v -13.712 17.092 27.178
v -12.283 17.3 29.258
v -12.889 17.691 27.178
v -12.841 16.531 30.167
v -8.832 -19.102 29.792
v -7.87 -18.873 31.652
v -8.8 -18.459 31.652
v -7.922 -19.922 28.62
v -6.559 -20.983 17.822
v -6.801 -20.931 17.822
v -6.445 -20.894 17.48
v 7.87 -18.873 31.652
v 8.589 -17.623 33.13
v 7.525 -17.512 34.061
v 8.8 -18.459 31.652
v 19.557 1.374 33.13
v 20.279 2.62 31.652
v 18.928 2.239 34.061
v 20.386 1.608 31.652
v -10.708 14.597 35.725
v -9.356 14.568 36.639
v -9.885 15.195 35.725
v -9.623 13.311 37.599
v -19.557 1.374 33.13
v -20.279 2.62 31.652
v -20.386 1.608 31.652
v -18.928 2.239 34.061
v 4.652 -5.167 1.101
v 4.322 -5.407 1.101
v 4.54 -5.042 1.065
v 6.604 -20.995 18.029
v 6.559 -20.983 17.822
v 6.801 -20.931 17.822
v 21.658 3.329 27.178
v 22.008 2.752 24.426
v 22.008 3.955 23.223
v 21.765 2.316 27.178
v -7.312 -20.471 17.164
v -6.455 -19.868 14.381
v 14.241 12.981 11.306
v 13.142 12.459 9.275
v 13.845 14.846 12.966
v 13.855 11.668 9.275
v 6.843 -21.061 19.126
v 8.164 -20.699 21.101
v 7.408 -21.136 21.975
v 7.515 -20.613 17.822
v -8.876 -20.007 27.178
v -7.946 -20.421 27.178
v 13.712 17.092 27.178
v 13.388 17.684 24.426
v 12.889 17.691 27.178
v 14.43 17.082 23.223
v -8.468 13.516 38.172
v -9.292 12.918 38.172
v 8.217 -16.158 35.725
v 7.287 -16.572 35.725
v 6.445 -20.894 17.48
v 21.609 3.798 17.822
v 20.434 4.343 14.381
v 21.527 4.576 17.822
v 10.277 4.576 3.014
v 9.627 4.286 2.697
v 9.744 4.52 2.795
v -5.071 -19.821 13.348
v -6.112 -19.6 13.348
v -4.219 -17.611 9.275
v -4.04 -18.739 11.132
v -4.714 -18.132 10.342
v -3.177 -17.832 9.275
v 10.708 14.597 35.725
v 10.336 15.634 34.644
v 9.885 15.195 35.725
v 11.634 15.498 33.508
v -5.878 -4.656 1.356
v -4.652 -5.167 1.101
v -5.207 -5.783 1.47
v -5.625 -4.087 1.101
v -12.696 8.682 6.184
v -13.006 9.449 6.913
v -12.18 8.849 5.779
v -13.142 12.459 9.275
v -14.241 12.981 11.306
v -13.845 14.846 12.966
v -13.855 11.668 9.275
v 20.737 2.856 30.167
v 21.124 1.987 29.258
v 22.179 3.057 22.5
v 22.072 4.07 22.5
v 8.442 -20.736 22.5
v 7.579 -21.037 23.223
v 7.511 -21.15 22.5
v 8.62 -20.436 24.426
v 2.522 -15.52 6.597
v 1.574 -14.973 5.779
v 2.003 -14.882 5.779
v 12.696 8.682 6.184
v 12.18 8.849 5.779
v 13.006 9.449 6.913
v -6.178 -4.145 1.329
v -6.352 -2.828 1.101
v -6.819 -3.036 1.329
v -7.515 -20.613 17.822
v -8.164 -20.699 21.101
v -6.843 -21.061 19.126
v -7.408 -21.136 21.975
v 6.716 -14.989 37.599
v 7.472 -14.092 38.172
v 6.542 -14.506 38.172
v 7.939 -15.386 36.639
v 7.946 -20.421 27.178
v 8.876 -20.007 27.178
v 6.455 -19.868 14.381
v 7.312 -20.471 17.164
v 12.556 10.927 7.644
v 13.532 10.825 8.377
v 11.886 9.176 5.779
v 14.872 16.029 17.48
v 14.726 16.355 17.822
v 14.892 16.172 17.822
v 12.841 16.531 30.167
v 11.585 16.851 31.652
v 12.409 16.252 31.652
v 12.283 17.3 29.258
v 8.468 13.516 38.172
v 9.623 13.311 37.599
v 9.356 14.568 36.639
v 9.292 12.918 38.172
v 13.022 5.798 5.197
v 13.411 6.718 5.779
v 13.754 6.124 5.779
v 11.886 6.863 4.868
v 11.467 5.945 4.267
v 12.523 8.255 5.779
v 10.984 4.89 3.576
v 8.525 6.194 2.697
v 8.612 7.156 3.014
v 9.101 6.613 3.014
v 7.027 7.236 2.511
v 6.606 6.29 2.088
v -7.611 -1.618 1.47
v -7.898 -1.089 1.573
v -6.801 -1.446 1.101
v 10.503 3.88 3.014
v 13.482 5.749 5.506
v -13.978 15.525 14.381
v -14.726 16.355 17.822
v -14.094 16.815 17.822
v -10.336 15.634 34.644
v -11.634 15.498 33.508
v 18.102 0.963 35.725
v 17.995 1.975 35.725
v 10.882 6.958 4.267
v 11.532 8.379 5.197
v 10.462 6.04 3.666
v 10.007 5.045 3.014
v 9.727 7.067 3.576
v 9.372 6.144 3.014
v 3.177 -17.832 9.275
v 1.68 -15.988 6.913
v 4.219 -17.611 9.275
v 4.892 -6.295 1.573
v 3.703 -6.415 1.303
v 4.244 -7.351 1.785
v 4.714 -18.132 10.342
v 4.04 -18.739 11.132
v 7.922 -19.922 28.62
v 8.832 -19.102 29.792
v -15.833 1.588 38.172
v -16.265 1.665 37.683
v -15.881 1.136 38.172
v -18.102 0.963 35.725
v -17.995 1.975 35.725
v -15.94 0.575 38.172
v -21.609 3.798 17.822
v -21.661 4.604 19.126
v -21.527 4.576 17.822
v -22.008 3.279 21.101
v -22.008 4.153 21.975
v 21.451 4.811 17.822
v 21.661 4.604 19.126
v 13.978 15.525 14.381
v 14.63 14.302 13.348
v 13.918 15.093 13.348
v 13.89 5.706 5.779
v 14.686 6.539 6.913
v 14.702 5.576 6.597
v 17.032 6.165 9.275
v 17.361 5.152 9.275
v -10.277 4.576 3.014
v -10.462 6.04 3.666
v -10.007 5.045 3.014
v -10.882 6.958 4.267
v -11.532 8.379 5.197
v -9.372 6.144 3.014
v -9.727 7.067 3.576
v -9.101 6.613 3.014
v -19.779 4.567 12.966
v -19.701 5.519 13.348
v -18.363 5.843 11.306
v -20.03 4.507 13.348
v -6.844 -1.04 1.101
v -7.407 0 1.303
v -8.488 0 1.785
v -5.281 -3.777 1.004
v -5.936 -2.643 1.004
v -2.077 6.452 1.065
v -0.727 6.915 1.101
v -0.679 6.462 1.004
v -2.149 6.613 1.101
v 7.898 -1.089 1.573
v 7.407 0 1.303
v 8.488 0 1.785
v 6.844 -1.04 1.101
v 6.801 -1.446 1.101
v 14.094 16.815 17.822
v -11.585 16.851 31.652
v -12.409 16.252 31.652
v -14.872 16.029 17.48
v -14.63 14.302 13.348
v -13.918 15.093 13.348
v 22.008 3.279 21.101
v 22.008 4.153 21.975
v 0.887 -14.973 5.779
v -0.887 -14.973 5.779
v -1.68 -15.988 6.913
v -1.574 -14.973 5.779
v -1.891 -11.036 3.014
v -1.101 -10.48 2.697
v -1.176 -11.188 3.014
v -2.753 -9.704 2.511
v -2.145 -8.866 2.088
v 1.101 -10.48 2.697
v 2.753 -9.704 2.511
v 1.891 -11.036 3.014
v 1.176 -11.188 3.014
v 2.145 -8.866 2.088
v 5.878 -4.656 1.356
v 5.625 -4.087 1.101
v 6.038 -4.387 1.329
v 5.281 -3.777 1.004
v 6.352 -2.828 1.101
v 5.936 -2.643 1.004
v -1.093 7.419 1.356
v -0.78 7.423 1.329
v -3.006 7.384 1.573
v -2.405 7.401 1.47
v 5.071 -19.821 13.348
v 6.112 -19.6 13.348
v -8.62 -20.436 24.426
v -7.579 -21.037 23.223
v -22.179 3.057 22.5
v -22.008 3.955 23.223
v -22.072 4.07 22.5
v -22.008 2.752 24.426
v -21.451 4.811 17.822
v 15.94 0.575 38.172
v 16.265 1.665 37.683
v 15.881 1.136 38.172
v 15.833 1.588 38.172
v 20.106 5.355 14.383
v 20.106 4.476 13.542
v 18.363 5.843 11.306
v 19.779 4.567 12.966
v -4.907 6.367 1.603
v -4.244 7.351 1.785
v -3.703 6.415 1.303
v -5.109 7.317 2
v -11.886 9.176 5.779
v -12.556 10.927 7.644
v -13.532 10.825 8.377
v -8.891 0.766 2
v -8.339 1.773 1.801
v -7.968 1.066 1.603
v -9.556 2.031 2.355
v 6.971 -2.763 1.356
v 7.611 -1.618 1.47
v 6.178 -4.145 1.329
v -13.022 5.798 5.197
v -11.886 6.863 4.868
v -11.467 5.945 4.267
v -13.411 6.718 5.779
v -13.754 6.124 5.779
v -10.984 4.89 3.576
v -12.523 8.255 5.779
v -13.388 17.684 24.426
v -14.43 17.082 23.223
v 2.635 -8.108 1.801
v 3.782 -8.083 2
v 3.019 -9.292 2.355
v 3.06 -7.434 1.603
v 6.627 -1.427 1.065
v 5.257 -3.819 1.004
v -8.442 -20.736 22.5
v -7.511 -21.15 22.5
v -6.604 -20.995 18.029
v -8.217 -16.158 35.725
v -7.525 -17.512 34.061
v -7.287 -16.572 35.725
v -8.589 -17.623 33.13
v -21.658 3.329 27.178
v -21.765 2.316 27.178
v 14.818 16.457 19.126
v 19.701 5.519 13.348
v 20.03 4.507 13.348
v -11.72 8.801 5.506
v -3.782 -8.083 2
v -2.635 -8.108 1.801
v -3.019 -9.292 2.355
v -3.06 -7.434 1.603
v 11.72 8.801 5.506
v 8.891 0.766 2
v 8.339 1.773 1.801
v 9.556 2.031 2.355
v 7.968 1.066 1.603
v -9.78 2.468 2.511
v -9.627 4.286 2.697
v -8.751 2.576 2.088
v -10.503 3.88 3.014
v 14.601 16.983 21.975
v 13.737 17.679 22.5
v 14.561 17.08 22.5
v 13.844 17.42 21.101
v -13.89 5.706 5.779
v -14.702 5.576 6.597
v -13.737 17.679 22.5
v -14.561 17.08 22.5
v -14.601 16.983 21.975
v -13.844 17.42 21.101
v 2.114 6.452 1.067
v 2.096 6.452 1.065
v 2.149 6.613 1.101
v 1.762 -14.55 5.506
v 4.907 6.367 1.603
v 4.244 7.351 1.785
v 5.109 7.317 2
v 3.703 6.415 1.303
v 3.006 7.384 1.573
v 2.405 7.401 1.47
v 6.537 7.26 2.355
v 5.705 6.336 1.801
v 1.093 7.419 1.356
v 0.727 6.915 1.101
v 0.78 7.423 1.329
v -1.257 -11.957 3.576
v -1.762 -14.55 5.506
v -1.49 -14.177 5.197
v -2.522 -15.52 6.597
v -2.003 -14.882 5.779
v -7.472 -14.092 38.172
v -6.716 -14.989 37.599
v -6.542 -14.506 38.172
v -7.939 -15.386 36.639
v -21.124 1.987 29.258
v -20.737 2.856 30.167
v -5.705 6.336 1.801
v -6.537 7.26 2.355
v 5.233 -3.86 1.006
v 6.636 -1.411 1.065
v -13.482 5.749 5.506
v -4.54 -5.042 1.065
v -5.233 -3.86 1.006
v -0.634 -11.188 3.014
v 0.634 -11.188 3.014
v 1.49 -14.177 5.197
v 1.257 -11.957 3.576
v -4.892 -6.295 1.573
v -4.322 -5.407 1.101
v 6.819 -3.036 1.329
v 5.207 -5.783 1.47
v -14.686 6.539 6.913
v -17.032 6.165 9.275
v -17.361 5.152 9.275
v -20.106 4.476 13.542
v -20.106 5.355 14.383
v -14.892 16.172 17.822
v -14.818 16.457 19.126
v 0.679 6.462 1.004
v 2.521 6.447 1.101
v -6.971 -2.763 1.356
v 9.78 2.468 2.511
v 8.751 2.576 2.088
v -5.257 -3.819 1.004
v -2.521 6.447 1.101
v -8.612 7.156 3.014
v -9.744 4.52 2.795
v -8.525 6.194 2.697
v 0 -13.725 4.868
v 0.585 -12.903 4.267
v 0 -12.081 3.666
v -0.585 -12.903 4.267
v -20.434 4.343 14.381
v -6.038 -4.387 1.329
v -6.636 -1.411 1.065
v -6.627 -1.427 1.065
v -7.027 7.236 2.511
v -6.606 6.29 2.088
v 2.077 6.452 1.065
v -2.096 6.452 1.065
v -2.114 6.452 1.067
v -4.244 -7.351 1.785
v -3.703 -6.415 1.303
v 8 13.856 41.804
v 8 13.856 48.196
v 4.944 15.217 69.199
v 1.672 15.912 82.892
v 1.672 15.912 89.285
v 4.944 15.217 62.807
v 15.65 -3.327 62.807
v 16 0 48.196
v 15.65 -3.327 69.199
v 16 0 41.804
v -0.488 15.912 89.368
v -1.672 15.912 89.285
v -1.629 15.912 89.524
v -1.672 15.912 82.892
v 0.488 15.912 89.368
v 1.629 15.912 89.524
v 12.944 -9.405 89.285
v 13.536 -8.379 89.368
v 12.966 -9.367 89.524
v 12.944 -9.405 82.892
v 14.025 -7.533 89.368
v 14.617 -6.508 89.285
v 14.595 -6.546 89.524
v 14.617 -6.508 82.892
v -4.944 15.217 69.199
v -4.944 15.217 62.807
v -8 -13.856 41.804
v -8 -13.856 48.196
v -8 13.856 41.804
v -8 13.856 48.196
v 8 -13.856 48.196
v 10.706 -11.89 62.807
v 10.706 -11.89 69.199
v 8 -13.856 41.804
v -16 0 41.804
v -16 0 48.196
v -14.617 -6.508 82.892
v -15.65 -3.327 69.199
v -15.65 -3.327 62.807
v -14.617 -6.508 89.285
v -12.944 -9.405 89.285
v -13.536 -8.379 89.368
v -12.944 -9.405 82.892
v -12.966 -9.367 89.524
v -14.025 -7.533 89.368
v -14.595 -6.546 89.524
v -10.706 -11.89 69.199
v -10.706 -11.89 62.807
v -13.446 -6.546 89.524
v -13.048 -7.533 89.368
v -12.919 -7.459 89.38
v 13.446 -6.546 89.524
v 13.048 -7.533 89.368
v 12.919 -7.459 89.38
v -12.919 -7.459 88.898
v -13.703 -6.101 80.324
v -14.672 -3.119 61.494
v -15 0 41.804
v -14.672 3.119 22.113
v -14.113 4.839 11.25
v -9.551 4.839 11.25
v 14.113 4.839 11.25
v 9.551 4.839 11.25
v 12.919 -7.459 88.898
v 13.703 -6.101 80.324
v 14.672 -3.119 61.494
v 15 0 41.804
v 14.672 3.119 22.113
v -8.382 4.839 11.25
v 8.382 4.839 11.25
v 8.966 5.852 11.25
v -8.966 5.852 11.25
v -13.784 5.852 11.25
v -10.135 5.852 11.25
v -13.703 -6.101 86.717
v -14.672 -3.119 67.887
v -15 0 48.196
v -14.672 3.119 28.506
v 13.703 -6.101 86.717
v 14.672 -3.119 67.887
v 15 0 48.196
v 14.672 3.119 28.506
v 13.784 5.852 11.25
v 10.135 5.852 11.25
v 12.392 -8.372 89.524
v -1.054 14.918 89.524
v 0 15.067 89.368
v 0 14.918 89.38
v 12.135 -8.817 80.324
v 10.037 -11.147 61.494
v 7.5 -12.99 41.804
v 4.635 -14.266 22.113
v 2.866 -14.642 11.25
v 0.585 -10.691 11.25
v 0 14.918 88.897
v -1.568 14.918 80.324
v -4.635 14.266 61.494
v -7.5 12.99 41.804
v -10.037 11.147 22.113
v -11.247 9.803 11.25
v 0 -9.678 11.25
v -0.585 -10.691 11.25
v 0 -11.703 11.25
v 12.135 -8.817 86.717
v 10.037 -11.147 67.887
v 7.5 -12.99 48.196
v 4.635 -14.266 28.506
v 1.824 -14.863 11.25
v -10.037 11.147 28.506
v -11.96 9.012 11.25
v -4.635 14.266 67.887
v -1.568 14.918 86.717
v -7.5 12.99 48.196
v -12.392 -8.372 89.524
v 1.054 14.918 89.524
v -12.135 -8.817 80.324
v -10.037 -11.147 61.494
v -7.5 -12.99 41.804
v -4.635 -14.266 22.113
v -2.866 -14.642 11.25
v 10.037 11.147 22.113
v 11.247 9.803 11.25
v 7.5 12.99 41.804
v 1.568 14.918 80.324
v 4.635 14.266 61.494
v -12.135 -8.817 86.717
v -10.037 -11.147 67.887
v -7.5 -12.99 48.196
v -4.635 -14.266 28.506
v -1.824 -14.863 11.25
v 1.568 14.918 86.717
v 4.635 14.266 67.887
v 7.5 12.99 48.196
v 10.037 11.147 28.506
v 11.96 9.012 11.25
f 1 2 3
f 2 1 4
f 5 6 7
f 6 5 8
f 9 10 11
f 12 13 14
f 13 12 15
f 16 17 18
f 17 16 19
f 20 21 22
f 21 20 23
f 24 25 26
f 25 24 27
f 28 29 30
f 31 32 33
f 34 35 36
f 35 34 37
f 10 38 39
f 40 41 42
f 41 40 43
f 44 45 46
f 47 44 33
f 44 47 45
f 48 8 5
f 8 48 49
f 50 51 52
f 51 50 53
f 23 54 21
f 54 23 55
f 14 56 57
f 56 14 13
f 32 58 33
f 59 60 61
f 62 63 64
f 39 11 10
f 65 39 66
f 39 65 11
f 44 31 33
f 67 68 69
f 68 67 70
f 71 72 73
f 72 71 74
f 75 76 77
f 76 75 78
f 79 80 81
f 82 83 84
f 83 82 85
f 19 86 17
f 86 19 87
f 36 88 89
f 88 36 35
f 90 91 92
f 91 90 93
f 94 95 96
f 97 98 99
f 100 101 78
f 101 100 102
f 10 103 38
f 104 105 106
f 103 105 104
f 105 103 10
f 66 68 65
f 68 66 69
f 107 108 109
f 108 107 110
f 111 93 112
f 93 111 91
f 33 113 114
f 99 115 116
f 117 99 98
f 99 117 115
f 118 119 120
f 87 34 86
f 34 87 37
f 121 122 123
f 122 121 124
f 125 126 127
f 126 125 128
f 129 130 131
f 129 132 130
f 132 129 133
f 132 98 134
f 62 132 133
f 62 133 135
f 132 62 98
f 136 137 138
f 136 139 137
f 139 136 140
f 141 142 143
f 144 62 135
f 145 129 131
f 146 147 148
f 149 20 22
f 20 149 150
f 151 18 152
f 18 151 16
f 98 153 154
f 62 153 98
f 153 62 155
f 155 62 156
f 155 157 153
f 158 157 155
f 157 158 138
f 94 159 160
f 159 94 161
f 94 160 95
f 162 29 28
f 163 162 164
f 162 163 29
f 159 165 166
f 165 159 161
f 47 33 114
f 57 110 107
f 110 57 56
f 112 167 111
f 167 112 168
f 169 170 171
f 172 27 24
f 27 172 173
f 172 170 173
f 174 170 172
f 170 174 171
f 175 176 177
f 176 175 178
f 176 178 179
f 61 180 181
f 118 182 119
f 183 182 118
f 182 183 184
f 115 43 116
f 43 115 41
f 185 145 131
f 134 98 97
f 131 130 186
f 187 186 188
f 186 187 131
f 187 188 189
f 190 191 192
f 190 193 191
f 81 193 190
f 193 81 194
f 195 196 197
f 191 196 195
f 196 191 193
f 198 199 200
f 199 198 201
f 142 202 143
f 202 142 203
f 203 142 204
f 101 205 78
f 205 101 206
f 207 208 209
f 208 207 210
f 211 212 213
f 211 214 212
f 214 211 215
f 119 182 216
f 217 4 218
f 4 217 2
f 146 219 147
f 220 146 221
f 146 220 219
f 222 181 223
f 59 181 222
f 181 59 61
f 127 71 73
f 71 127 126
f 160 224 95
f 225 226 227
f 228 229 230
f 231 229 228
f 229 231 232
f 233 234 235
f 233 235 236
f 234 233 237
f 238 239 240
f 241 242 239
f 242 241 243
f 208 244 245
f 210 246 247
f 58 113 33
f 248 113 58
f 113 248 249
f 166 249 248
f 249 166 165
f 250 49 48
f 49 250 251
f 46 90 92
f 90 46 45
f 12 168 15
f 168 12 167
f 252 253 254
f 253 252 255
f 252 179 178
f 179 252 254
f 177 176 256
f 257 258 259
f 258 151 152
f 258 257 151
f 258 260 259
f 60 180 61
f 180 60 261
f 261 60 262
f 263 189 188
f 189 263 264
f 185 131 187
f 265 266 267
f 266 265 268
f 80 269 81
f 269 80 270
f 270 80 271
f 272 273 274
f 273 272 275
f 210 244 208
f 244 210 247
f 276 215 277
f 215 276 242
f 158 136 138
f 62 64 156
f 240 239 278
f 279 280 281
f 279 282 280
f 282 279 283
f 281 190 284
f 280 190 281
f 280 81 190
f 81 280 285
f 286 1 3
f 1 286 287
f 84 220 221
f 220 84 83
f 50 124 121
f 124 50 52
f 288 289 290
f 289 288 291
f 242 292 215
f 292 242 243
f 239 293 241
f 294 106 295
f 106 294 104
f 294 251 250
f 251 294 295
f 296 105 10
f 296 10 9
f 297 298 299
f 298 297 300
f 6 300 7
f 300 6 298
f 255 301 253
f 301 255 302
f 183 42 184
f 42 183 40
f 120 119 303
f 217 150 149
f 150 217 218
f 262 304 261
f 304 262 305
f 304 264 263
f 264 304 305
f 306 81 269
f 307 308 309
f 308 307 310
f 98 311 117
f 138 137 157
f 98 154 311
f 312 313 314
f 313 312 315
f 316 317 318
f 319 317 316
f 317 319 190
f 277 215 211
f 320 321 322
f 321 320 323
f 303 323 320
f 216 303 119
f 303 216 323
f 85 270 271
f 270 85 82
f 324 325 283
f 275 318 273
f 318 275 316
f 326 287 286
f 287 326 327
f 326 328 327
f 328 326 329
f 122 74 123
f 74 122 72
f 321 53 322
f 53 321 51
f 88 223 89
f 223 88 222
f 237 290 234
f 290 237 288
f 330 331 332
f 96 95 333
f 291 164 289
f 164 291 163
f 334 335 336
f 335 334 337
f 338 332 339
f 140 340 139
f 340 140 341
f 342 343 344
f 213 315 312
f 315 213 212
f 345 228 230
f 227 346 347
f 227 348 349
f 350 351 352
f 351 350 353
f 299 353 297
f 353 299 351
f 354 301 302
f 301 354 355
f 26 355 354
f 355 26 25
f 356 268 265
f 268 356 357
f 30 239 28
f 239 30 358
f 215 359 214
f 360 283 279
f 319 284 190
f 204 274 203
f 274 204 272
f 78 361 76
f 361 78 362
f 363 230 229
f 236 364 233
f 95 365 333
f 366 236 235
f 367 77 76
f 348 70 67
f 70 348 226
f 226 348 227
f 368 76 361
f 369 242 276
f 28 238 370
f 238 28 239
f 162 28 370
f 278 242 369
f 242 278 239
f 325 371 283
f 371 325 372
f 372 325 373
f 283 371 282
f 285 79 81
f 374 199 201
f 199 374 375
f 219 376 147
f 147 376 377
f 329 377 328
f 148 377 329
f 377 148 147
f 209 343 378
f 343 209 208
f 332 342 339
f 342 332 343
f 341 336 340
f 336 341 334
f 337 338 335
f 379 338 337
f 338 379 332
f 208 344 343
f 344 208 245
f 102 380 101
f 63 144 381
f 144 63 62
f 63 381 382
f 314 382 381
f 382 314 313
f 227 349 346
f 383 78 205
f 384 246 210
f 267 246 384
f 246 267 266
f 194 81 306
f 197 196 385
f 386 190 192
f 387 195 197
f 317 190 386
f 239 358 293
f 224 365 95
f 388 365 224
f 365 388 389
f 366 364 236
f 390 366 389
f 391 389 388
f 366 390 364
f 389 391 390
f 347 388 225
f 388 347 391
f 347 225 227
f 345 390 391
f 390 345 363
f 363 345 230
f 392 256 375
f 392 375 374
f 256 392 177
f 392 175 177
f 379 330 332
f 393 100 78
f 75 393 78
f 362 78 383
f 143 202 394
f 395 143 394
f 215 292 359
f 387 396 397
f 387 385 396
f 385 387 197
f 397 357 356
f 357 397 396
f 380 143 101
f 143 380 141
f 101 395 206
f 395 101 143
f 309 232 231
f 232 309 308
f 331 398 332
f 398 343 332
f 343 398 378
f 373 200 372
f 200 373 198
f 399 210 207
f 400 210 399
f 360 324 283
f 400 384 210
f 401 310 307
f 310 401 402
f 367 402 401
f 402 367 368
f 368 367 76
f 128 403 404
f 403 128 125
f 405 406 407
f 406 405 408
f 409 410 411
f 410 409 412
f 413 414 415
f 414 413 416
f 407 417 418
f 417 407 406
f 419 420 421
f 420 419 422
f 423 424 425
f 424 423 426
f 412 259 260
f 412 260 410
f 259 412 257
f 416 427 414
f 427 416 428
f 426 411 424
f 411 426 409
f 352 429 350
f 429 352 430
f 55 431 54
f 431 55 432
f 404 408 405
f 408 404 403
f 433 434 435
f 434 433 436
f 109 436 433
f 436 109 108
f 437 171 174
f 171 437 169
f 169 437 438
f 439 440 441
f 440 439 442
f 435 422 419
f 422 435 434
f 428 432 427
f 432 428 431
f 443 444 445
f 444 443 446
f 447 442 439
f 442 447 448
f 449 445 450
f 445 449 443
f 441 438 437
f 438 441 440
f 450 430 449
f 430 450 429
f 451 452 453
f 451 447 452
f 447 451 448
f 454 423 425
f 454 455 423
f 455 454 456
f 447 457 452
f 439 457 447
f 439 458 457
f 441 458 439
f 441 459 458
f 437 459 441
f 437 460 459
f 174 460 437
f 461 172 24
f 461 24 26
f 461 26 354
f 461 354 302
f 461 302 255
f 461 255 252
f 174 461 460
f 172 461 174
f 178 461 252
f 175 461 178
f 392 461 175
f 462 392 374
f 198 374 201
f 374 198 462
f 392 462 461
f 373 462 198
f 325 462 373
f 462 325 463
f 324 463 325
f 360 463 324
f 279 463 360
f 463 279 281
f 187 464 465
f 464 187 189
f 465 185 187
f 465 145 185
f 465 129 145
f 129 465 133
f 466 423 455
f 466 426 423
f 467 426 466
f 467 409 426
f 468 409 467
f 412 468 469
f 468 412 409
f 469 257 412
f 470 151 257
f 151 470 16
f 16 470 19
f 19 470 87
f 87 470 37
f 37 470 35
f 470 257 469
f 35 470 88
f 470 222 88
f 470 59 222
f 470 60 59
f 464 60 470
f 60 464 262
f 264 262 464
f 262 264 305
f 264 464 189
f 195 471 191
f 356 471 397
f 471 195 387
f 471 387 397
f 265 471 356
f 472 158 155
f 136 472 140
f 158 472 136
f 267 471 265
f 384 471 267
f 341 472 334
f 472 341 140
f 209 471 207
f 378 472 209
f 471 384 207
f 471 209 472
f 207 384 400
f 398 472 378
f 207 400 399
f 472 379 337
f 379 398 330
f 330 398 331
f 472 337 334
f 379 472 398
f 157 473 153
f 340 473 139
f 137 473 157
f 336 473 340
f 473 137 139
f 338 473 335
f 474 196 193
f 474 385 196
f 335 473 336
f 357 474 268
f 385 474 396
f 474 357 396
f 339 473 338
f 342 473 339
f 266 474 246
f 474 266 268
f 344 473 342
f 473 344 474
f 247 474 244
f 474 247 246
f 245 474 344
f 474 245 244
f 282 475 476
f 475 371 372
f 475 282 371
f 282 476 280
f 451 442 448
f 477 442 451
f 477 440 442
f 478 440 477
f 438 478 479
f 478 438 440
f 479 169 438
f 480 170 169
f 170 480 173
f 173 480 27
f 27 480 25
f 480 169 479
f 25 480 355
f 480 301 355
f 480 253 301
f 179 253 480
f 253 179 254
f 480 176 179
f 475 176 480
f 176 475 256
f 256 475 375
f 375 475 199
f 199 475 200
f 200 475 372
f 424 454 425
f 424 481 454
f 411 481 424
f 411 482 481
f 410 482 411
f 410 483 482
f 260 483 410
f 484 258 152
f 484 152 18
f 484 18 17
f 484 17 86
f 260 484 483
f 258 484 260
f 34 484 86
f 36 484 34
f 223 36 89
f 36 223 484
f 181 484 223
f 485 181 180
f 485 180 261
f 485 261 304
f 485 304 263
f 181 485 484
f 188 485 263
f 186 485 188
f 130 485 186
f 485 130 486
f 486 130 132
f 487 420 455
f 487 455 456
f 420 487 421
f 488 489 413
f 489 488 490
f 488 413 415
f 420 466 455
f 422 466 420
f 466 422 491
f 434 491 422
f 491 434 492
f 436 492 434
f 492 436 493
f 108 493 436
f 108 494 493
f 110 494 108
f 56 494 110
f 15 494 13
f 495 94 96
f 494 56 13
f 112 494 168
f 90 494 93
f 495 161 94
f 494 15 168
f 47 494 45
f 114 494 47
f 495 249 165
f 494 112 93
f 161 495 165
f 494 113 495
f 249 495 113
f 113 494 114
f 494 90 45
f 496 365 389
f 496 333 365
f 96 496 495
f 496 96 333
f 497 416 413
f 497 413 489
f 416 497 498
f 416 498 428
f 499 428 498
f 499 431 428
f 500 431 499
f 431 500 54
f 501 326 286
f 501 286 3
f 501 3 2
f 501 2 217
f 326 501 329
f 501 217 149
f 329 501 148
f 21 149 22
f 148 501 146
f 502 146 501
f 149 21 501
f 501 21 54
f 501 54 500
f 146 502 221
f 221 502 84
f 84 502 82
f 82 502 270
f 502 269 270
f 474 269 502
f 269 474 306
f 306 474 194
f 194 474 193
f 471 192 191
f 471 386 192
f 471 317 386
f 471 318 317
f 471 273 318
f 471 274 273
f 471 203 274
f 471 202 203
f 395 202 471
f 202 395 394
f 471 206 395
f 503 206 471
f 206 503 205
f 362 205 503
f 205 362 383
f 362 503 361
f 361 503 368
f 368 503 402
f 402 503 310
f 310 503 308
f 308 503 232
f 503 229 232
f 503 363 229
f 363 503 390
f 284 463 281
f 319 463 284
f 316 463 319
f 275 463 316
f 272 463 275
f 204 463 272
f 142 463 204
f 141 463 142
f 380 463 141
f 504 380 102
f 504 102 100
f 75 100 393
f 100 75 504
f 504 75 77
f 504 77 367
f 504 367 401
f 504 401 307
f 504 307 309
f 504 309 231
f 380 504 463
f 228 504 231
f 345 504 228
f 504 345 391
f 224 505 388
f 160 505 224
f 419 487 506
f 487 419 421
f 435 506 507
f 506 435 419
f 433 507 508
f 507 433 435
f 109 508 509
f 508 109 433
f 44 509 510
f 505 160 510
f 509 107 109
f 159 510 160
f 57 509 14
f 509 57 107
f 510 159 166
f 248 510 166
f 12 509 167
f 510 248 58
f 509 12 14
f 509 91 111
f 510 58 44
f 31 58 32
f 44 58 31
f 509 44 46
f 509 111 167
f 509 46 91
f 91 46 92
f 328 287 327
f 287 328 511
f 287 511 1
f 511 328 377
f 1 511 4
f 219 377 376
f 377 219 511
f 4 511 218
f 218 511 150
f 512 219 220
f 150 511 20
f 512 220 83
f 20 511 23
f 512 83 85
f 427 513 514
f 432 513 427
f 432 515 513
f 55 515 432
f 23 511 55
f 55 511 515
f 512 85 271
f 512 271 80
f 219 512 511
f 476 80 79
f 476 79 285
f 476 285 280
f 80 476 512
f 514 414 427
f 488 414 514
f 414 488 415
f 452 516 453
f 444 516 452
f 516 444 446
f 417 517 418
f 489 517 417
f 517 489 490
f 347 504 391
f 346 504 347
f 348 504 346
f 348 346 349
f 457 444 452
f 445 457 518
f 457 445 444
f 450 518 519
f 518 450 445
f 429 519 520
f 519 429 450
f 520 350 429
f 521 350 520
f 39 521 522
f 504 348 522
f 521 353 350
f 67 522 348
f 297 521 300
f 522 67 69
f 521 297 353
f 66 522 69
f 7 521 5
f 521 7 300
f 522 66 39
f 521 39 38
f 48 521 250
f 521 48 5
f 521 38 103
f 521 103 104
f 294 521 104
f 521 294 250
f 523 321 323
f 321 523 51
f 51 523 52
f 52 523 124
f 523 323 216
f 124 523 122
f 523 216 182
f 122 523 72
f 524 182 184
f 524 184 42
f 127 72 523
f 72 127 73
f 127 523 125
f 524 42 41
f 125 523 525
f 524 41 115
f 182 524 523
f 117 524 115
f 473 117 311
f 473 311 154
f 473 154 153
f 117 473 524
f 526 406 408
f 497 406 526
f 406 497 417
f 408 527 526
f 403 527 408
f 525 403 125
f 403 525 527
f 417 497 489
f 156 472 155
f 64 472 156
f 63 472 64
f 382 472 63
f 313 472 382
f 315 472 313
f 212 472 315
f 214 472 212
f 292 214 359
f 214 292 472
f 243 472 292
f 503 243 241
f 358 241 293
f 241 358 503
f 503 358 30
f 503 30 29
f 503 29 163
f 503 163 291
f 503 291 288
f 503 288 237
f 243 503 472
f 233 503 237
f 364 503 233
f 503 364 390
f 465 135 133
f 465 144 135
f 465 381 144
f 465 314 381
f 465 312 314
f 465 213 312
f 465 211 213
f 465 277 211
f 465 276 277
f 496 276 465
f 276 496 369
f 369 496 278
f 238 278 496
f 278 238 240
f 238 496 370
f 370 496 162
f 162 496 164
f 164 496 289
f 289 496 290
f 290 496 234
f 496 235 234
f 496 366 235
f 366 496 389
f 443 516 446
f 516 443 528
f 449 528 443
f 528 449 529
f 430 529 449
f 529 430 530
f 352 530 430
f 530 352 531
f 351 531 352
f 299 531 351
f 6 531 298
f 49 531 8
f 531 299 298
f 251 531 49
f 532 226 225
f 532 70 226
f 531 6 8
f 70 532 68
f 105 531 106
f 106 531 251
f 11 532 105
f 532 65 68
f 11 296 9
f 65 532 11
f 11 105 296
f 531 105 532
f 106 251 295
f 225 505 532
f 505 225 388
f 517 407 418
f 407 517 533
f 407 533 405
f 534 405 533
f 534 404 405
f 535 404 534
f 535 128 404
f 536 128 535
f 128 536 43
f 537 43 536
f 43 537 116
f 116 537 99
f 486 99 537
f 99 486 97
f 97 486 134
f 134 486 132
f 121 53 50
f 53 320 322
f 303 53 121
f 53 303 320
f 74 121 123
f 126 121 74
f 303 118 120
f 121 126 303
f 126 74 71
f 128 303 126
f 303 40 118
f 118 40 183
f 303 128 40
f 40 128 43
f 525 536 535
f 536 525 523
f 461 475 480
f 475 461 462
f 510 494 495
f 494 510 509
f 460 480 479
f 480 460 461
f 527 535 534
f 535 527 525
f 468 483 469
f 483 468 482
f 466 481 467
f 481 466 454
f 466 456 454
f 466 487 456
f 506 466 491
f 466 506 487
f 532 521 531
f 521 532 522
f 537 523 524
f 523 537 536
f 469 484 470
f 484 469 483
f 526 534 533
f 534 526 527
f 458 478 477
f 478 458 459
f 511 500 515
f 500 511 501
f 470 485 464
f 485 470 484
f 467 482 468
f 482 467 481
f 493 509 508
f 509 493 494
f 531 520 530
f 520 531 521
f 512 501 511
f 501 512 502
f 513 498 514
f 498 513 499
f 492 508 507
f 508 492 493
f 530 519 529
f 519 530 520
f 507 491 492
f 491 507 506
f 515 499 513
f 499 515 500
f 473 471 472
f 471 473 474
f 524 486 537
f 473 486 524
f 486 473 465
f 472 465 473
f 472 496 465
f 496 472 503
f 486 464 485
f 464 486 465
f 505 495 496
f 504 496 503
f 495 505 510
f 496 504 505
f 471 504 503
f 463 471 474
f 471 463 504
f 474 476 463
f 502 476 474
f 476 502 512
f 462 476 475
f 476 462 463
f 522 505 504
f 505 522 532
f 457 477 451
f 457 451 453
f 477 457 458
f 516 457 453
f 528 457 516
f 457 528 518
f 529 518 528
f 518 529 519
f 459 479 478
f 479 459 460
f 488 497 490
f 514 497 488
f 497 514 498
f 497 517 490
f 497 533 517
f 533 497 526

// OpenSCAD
// design parameters

planes=3;       //  3,4...   (2 for a dob like rockers)
tilt=9;        // +/- angles in degrees (zero for Chuck & Davids) 
intersect=-45;  // +/- units from bottom of ball for planes to meet


// ota parameters 
ota_id=30;
F_ratio=3;
thickness=1;
factor=1.5;


////////////////////////
// derived variables
ota_ir=ota_id/2;
ota_or=ota_ir+thickness;  
ball_r=ota_ir*factor;
delta=360/planes;


module sheet (w, t, h, r) {
   translate([0,0,-intersect])
	rotate(a=[tilt,0,r]) 
   translate([0,0,h/2+intersect])
		cube(size=[w,t,h],center=true);
}


difference() {
	intersection() {	
		union(){
		translate([0,0,ball_r])
		 sphere(ball_r);
			translate([0,0,ball_r])
				 cylinder(r=ota_or,h=F_ratio*ota_id);
		}	
		union(){
			for(rot=[0:delta:360]) 
				sheet(2*ball_r,thickness,4*ball_r, rot);
		}
	}
	translate([0,0,ball_r/2])
		cylinder(r=ota_ir,h=F_ratio*ota_id);
}

// show primay light path
 translate([0,0,ball_r/2]) 
		%cylinder(r=ota_ir,h=F_ratio*ota_id);
